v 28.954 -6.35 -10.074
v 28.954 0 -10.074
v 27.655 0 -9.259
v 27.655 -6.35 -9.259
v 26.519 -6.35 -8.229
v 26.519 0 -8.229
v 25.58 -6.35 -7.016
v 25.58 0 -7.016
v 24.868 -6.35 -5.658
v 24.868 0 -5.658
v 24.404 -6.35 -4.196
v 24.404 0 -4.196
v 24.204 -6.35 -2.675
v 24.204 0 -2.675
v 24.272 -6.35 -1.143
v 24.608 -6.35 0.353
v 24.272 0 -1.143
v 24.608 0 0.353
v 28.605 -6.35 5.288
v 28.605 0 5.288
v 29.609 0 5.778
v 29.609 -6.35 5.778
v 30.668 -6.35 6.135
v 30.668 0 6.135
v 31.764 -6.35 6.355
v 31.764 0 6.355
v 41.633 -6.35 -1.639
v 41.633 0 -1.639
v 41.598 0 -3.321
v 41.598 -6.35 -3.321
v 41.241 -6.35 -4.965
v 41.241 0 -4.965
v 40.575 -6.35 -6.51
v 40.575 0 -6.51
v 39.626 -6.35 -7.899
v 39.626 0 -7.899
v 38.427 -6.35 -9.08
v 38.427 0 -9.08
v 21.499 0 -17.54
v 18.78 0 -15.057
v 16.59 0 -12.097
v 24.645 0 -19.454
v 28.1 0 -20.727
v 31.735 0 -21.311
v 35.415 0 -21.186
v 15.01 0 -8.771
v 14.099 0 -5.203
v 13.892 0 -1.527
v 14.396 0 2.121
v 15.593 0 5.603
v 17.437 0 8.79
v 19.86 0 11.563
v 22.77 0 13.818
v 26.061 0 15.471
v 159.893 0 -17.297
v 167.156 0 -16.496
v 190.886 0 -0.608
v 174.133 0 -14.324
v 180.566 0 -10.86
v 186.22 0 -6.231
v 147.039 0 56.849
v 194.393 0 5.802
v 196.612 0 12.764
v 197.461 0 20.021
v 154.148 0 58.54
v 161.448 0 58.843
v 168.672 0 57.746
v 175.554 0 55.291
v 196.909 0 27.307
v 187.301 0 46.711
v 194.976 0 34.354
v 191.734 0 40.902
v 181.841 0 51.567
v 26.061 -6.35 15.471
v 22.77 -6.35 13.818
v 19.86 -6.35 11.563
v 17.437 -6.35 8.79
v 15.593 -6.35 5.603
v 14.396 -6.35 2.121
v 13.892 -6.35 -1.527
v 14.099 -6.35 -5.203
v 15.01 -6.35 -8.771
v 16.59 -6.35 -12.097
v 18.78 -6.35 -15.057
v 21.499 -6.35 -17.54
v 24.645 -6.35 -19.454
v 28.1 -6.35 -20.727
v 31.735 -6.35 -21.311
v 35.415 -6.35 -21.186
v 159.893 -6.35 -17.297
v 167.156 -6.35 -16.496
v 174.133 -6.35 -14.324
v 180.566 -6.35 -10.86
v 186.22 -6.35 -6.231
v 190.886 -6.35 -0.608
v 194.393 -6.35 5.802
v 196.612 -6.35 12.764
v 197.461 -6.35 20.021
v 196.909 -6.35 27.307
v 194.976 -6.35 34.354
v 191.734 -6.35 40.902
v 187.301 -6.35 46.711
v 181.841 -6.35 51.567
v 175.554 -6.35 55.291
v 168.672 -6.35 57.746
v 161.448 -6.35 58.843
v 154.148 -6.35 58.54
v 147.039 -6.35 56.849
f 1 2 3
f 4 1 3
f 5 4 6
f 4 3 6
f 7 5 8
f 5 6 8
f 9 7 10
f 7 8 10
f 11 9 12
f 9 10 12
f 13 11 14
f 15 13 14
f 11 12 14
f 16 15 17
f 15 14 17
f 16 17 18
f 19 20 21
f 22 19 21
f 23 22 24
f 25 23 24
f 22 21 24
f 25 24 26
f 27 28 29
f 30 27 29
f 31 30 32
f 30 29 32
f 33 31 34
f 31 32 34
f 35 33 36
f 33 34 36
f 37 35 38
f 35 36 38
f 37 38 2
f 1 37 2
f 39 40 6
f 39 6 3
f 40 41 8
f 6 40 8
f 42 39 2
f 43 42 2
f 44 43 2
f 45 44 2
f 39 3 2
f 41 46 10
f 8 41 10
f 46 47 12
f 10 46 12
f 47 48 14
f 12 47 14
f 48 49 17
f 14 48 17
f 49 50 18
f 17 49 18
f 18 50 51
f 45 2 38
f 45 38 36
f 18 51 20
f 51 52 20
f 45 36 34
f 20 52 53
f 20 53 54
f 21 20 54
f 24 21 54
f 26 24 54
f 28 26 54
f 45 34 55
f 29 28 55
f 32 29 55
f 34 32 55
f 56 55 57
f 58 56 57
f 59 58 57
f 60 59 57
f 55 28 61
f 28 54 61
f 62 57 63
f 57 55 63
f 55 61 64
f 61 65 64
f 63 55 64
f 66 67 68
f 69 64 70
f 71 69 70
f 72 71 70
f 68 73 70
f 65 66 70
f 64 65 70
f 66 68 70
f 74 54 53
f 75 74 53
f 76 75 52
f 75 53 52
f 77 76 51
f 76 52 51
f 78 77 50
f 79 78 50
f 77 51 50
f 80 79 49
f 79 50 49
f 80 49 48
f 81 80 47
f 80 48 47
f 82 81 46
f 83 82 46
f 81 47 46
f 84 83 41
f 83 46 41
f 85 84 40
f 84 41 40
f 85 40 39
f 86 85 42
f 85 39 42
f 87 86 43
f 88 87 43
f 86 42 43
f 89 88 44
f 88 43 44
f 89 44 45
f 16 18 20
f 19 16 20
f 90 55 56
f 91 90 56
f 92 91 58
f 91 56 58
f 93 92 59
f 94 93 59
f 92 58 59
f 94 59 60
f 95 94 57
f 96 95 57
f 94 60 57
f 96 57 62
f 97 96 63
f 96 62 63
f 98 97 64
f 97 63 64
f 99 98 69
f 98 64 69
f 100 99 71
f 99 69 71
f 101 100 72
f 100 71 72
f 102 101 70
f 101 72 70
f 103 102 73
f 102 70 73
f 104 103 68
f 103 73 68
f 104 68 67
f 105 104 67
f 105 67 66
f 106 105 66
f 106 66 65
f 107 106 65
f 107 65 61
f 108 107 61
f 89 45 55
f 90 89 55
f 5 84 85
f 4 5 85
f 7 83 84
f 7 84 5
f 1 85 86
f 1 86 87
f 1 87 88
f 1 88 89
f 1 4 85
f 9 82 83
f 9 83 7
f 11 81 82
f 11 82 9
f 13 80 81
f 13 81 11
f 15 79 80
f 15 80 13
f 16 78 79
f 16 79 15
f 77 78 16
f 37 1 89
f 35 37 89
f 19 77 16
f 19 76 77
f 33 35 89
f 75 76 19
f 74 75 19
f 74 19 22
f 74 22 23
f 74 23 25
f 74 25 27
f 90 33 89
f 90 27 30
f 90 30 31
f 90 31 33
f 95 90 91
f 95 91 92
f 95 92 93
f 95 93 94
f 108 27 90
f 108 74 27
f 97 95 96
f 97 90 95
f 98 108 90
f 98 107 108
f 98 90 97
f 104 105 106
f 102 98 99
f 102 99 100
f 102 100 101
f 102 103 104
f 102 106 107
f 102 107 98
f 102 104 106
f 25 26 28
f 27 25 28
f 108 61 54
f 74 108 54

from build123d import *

# Parameters (mm, degrees)
F1_DEPTH = 6.35


with BuildPart() as f1:
    # F0 (on Front) → F1 (new body)
    with BuildSketch(Plane.XZ):
        with BuildLine():
            Line((147.03905, 56.8491), (26.060874, 15.470934))
            ThreePointArc((26.060874, 15.470934), (14.468308, -7.009272), (35.415419, -21.185511))
            Line((35.415419, -21.185511), (159.893201, -17.296974))
            ThreePointArc((159.893201, -17.296974), (196.909173, 27.30746), (147.03905, 56.8491))
        make_face()
        with BuildLine():
            ThreePointArc((28.604817, 5.287778), (30.133109, 5.973494), (31.764223, 6.354742))
            Line((31.764223, 6.354742), (41.633012, -1.638817))
            ThreePointArc((41.633012, -1.638817), (40.945432, -5.75352), (38.427272, -9.079542))
            Line((38.427272, -9.079542), (28.954331, -10.074033))
            ThreePointArc((28.954331, -10.074033), (24.867546, -5.657956), (24.608037, 0.353383))
            Line((24.608037, 0.353383), (28.604817, 5.287778))
        make_face(mode=Mode.SUBTRACT)
    extrude(amount=F1_DEPTH)


solid = f1.part
